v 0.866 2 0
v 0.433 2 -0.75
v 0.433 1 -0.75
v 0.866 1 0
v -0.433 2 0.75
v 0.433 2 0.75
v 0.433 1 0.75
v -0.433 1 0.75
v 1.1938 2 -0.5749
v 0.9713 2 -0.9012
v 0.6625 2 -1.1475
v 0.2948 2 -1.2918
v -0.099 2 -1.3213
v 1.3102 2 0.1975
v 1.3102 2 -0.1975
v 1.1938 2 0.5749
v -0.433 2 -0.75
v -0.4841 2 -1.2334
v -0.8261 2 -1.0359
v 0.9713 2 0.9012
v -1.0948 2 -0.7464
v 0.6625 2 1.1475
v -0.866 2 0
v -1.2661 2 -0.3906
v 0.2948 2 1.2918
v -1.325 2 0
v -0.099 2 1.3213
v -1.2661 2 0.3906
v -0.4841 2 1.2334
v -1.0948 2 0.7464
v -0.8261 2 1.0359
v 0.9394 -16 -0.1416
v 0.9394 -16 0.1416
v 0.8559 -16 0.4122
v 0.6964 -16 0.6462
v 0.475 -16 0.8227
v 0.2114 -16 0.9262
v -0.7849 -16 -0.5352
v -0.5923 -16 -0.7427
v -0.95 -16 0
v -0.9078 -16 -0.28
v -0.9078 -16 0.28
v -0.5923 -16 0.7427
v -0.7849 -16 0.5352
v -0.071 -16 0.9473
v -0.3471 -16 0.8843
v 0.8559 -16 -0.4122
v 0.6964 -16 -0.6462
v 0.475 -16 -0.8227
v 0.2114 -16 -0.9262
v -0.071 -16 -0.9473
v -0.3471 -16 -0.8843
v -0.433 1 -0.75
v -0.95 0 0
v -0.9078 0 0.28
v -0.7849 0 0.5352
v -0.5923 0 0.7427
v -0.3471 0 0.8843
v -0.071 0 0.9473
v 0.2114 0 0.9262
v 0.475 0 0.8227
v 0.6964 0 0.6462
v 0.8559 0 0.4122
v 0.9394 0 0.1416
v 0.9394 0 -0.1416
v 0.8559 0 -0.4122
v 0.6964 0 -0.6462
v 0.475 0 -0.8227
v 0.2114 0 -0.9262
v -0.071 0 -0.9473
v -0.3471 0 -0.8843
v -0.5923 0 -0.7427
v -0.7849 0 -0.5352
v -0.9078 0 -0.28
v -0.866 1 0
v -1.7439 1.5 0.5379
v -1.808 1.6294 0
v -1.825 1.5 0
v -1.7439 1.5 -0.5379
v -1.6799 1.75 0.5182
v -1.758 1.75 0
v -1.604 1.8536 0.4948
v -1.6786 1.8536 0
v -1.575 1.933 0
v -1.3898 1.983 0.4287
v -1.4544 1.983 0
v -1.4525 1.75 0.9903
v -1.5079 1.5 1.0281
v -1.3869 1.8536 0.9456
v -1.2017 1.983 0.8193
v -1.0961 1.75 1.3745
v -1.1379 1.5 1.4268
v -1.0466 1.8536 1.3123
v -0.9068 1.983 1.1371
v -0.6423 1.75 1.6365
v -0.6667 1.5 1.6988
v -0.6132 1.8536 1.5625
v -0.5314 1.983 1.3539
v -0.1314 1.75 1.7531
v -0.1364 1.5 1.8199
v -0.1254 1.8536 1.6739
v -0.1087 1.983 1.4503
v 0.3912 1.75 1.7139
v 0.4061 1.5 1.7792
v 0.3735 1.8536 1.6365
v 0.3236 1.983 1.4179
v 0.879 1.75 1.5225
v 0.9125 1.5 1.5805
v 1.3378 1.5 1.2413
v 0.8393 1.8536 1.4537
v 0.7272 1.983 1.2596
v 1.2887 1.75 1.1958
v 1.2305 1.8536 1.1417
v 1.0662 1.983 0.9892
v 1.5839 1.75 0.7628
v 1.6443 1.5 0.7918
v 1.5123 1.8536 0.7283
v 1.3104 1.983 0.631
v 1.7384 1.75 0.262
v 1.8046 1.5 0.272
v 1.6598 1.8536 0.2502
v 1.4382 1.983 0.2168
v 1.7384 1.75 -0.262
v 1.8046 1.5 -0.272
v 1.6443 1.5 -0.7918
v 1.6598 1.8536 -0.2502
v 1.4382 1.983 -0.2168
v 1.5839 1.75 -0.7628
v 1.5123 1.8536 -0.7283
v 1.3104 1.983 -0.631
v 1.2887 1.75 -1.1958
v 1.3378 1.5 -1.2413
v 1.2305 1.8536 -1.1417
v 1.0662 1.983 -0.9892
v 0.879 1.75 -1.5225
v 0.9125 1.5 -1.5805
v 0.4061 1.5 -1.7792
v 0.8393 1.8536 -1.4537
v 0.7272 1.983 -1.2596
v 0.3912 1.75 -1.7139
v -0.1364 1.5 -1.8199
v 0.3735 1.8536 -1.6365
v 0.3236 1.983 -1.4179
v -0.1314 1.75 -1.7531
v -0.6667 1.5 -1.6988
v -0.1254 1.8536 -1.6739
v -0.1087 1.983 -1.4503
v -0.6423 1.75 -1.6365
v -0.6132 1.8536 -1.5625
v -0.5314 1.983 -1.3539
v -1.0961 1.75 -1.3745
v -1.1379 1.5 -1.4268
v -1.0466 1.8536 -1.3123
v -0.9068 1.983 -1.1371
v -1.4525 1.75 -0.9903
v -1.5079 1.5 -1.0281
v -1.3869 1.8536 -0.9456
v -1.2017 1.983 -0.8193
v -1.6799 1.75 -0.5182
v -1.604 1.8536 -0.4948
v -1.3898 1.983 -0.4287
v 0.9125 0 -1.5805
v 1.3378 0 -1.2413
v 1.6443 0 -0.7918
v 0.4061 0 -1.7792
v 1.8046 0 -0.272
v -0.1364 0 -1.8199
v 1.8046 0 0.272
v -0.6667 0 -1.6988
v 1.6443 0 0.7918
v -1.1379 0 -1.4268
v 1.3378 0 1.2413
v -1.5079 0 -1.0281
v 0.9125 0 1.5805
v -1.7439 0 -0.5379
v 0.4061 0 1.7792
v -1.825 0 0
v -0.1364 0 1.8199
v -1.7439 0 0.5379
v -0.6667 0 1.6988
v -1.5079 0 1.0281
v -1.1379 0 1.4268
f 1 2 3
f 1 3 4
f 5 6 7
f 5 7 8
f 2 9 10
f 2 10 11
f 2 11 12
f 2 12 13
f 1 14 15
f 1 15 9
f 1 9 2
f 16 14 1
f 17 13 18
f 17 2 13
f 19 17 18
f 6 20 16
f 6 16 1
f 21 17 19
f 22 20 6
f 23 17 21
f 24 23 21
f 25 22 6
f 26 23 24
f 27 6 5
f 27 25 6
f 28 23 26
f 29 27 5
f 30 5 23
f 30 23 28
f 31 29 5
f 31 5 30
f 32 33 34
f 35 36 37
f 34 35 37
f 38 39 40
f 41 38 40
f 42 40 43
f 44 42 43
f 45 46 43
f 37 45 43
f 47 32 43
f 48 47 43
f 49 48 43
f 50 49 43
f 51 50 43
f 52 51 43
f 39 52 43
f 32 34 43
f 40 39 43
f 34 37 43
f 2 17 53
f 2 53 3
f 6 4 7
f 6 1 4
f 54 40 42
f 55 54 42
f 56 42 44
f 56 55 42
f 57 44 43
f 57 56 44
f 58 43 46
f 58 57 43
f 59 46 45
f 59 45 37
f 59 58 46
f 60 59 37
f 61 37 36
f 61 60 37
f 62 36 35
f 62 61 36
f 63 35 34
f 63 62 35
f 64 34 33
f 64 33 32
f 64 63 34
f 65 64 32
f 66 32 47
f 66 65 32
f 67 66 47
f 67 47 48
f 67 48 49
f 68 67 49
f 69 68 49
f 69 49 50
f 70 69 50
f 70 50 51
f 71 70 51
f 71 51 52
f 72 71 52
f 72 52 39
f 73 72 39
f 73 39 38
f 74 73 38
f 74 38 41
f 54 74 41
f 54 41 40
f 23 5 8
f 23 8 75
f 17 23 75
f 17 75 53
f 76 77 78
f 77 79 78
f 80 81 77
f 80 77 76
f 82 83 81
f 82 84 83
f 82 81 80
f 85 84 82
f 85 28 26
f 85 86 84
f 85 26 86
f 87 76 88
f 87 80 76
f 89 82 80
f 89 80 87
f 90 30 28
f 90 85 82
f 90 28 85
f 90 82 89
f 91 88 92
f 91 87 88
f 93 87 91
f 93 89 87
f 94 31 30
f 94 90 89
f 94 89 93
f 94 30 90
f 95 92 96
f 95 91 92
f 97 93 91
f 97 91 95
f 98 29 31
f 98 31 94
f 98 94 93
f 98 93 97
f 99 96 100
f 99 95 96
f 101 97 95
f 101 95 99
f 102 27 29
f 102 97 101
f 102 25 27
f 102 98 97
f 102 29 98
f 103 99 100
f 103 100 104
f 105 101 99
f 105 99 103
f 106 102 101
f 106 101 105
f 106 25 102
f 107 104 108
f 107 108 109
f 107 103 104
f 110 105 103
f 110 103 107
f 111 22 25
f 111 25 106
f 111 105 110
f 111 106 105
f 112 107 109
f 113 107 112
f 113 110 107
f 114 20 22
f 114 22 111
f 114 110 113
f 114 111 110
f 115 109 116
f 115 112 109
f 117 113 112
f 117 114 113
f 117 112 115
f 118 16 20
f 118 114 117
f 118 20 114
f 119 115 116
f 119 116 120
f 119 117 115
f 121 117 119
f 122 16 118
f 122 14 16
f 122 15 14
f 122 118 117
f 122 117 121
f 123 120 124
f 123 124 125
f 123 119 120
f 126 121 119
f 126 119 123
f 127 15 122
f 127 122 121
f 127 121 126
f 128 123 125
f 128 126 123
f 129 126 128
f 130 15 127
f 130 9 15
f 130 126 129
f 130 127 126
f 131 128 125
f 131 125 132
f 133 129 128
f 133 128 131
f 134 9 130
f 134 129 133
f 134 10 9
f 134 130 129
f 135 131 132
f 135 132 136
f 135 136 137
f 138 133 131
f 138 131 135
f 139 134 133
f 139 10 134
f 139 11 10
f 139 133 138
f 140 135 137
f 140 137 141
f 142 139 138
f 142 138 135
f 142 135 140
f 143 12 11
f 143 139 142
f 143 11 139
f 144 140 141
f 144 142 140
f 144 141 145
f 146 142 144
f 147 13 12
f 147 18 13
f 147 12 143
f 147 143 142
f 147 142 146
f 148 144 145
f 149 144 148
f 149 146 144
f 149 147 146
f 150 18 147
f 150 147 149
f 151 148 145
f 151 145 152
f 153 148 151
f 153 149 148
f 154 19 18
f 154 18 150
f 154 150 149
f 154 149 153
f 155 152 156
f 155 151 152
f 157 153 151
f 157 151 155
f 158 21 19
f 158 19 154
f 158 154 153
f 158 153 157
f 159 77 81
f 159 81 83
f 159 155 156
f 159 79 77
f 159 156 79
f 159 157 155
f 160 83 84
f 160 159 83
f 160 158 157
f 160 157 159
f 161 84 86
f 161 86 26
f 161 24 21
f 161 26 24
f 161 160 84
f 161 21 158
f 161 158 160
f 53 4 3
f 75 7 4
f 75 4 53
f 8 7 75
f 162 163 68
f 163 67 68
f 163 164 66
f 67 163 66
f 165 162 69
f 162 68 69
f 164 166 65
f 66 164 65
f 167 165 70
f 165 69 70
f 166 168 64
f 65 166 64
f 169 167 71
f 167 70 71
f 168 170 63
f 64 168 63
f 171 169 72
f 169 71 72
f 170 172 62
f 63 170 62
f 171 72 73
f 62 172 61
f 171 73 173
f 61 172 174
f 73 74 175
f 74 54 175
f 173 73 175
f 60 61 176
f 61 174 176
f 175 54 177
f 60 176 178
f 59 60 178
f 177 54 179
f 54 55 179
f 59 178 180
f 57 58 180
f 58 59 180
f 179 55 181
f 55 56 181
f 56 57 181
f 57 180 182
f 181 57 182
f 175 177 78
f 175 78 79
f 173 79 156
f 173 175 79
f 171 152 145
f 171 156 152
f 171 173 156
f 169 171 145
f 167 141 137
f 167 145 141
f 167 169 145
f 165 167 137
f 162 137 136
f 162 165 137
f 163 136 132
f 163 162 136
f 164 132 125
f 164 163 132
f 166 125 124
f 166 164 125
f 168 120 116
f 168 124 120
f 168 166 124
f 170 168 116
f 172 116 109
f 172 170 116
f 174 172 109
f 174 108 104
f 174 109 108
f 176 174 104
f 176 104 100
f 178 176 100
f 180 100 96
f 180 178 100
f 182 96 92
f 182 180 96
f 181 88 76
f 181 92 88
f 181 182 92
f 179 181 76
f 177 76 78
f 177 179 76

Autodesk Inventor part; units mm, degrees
ref_plane "YZ Plane" through (0, 0, 0) normal (1, 0, 0) x (0, 1, 0)
ref_plane "XZ Plane" through (0, 0, 0) normal (0, 1, 0) x (-1, 0, 0)
ref_plane "XY Plane" through (0, 0, 0) normal (0, 0, 1) x (1, 0, 0)
sketch "Sketch1" plane through (0, 0, 0) normal (0, 1, 0) x (-1, 0, 0)
  circle A0 centre (0, 0) radius 0.95
  circle A1 centre (0, 0) radius 1.825
  line L0 (0.433, -0.75) -> (-0.433, -0.75)
  line L1 (-0.433, -0.75) -> (-0.866, 0)
  line L2 (-0.866, 0) -> (-0.433, 0.75)
  line L3 (-0.433, 0.75) -> (0.433, 0.75)
  line L4 (0.433, 0.75) -> (0.866, 0)
  line L5 (0.866, 0) -> (0.433, -0.75)
  dimension "d0" = 1.9
  dimension "d1" = 3.65
  dimension "d8" = 1.5
extrude "Extrusion1" add sketch "Sketch1" along normal blind 2 contours A0 | A1 | L0 L1 L2 L3 L4 L5
extrude "Extrusion2" add sketch "Sketch1" against normal blind 16 contours A0 | L0 L1 L2 L3 L4 L5
extrude "Extrusion3" cut sketch "Sketch1" against normal blind 1 from surface at 2 contours L0 L1 L2 L3 L4 L5
fillet "Fillet1" radius 0.5 1 edges at (1.825, 2, 0)
thread "Thread2" size "M2x0.4" class "6g" standard "ANSI Metric M Profile" full length
equation "\"d4\" = length"
equation "\"length\" = 16"
properties part number "M2x16"
